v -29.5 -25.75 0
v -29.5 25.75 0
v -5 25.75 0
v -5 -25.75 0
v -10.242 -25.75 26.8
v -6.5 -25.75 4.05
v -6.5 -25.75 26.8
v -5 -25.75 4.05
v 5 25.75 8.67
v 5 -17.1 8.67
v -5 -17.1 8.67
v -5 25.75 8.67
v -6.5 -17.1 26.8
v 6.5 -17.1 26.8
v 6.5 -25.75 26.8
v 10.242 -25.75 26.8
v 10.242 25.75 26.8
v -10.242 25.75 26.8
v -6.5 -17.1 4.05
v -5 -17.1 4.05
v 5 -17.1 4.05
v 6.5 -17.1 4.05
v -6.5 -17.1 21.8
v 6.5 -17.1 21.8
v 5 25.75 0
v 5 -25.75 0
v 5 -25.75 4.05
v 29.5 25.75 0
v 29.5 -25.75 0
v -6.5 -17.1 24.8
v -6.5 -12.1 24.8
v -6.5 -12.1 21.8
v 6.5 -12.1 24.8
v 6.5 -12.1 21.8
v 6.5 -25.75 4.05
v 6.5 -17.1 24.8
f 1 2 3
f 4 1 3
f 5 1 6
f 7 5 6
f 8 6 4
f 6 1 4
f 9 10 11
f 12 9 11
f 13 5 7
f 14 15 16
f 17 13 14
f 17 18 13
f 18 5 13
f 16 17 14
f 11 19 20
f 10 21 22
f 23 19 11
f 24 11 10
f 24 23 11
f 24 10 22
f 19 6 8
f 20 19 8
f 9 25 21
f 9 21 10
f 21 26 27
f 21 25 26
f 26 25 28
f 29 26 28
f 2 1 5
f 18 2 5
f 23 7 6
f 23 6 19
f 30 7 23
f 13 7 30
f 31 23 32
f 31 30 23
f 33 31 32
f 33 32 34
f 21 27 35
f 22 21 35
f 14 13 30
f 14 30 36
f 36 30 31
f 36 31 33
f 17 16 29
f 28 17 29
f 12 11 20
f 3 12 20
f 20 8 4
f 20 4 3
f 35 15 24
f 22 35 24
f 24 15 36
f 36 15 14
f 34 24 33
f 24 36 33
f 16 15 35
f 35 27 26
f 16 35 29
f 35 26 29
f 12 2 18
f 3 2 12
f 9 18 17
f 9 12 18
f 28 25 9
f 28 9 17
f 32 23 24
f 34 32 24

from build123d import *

# Parameters (mm, degrees)
F0_W      = 59
F0_H      = 51.5
F1_DEPTH  = 26.8
F2_W      = 10
F2_H      = 8.65
F3_DEPTH  = 26.8
F4_W      = 1.5
F4_H      = 8.65
F5_DEPTH  = 22.75
F7_DEPTH  = 51.5
F9_DEPTH  = 51.5
F11_DEPTH = 51.5
F12_W     = 13
F12_H     = 3
F13_DEPTH = 5


with BuildPart() as f1:
    # F0 (on Top) → F1 (new body)
    with BuildSketch(Plane.XY):
        Rectangle(F0_W, F0_H)
    extrude(amount=F1_DEPTH)

    # F2 (on face) → F3 (cut)
    with BuildSketch(Plane.XY.offset(26.8)):
        with Locations((0, -21.425)):
            Rectangle(F2_W, F2_H)
    extrude(amount=-F3_DEPTH, mode=Mode.SUBTRACT)

    # F4 (on face) → F5 (cut)
    with BuildSketch(Plane.XY.offset(26.8)):
        with Locations((-5.75, -21.425)):
            Rectangle(F4_W, F4_H)
        with Locations((5.75, -21.425)):
            Rectangle(F4_W, F4_H)
    extrude(amount=-F5_DEPTH, mode=Mode.SUBTRACT)

    # F6 (on face) → F7 (cut)
    with BuildSketch(Plane.XZ.offset(25.75)):
        Polygon((-29.5, 26.8), (-29.5, 0), (-10.242246399, 26.8), align=None)
    extrude(amount=-F7_DEPTH, mode=Mode.SUBTRACT)

    # F8 (on face) → F9 (cut)
    with BuildSketch(Plane.XZ.offset(25.75)):
        Polygon((10.242246399, 26.8), (29.5, 0), (29.5, 26.8), align=None)
    extrude(amount=-F9_DEPTH, mode=Mode.SUBTRACT)

    # F10 (on face) → F11 (cut)
    with BuildSketch(Plane.XZ.offset(17.1)):
        Polygon((5, 8.67), (-5, 8.67), (-5, 4.05), (-5, 0), (5, 0), (5, 4.05), align=None)
    extrude(amount=-F11_DEPTH, mode=Mode.SUBTRACT)

    # F12 (on face) → F13 (cut)
    with BuildSketch(Plane.XZ.offset(17.1)):
        with Locations((0, 23.3)):
            Rectangle(F12_W, F12_H)
    extrude(amount=-F13_DEPTH, mode=Mode.SUBTRACT)


solid = f1.part
